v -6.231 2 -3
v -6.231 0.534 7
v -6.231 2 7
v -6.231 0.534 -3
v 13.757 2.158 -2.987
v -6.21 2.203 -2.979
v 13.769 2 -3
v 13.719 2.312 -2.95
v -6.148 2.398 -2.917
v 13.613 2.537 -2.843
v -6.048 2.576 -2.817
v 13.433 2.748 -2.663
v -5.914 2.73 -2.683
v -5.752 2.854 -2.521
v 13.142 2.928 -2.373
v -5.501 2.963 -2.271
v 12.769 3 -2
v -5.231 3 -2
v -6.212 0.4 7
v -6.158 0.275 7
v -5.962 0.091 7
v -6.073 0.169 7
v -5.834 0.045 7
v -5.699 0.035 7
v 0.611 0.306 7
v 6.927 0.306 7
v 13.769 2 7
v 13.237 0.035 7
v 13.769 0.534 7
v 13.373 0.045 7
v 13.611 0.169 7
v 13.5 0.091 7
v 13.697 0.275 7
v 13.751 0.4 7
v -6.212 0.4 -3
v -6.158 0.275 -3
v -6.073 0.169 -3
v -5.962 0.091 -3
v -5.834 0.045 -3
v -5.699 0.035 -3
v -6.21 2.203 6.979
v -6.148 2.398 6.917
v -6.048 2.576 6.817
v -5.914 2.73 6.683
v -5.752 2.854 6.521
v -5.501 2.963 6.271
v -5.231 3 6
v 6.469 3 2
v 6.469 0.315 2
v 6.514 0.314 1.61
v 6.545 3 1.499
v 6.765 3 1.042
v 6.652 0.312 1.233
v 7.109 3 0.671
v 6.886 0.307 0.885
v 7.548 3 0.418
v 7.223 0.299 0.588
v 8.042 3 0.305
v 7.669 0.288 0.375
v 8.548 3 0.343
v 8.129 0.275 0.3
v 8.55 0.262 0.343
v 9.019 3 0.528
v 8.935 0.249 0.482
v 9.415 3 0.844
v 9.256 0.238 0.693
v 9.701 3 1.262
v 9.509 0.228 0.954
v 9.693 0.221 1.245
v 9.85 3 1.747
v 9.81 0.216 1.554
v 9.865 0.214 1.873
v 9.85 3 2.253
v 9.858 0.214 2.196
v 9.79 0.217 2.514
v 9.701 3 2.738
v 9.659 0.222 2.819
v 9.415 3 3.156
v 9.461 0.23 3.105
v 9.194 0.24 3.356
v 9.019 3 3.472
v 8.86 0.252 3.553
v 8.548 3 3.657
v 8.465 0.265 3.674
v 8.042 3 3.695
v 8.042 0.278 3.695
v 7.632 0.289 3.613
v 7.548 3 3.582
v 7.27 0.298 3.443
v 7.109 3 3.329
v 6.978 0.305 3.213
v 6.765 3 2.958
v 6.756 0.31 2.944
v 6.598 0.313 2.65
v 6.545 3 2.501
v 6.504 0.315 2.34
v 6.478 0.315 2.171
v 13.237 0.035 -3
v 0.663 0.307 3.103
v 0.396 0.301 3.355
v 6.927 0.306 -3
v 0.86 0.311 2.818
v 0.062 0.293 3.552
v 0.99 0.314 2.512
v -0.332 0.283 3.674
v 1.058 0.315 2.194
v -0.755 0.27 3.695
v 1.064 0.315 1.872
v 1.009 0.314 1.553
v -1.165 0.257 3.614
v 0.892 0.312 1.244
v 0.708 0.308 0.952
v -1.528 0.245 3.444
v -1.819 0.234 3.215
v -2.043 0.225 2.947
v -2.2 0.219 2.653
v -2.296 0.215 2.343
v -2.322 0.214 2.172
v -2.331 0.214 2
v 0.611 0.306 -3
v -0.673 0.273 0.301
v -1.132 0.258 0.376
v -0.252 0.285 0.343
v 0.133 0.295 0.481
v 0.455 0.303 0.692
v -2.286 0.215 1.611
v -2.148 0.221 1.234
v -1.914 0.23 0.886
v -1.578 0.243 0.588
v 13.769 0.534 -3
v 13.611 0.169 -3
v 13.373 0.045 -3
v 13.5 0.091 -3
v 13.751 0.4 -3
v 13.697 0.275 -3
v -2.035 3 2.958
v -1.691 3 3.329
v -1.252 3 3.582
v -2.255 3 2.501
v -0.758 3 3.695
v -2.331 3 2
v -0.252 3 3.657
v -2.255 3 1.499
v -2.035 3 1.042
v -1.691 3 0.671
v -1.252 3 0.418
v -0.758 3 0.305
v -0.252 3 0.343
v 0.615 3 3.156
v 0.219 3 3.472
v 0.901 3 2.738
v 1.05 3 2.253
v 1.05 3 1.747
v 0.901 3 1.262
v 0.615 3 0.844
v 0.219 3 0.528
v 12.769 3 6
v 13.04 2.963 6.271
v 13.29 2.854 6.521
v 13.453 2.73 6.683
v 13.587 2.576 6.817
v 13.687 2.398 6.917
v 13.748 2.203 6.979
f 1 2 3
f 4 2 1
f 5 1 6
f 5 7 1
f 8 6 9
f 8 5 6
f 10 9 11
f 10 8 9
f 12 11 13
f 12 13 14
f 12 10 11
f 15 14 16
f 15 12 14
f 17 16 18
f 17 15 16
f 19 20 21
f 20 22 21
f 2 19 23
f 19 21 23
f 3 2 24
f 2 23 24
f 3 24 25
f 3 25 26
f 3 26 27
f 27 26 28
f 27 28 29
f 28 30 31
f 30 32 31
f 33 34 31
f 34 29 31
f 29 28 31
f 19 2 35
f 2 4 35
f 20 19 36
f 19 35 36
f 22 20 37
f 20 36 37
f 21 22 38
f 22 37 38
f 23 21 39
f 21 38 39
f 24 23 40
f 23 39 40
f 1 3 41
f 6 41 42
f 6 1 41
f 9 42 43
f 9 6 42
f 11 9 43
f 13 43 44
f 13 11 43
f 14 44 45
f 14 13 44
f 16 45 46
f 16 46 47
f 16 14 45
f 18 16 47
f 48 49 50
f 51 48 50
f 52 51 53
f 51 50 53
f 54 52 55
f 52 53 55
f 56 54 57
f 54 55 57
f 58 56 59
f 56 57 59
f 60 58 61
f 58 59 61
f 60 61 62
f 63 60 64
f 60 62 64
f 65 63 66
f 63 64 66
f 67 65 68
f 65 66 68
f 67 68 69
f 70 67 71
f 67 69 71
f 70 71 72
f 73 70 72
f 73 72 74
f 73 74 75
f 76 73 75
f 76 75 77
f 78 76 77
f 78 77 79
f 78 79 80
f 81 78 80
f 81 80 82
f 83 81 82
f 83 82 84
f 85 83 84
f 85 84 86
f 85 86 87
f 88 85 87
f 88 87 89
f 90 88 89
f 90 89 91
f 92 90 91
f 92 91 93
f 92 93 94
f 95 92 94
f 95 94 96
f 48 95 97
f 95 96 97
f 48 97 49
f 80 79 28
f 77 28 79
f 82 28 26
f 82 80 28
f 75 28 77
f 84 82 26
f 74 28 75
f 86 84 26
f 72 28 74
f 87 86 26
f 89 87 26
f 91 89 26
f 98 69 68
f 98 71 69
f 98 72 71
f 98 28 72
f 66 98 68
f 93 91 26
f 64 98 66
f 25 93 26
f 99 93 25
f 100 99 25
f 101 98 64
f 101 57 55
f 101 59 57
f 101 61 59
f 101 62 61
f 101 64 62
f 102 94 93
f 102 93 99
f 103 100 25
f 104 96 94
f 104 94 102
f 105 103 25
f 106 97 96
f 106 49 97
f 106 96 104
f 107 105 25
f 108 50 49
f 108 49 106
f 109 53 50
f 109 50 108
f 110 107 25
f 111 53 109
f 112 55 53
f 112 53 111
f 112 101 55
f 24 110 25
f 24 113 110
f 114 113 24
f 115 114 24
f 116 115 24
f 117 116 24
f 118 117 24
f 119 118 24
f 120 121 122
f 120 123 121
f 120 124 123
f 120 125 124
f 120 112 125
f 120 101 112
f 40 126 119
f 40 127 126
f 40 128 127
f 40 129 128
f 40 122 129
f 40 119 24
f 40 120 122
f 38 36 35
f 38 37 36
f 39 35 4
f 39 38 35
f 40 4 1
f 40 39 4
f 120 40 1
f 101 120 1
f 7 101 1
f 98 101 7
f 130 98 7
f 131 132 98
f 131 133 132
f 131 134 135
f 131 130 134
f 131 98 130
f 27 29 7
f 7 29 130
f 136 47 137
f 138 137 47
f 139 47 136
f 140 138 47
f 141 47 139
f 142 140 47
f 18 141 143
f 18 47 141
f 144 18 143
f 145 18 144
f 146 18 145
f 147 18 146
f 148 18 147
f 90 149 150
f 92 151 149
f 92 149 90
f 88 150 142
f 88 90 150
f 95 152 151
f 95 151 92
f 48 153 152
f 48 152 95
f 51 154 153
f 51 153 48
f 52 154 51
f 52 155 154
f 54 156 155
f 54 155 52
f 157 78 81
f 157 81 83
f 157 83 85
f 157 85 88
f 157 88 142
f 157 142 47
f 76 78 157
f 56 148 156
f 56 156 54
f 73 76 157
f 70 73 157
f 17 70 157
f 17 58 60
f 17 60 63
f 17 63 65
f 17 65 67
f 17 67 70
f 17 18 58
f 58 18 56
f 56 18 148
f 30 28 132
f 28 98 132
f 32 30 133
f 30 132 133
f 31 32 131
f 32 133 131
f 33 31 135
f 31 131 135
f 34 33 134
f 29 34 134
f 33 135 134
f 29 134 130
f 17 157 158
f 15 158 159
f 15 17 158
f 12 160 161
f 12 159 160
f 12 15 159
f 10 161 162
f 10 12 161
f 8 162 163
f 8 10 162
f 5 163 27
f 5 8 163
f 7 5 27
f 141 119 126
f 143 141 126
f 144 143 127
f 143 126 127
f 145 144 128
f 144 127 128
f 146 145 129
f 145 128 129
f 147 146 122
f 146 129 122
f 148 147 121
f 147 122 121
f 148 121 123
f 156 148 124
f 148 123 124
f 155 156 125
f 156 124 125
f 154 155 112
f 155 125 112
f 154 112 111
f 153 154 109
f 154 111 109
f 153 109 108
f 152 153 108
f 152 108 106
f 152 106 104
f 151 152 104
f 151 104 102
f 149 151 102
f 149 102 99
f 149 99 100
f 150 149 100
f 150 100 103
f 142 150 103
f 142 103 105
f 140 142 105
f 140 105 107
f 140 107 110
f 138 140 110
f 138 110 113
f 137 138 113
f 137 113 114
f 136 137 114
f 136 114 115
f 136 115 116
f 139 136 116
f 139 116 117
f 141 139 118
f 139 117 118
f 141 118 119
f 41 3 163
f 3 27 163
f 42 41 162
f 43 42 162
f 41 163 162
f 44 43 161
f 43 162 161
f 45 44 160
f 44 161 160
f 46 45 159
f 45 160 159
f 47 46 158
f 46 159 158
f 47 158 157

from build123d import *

# Parameters (mm, degrees)
SKETCH1_W            = 20
SKETCH1_H            = 10
BOSS_EXTRUDE1_DEPTH  = 3
M3_CLEARANCE_HOLE1_D = 3.4
FILLET3_R            = 1
CUT_EXTRUDE4_START   = -10
CUT_EXTRUDE4_DEPTH   = 10
FILLET4_R            = 0.5


# Read off the part's stored shape, not the designer's step: Cut-Extrude4
with BuildPart() as part:
    # Sketch1 → Boss-Extrude1 (new body)
    with BuildSketch(Plane(origin=(0, 0, 0), x_dir=(1, 0, 0), z_dir=(0, 1, 0))):
        with Locations((3.769230769, -2)):
            Rectangle(SKETCH1_W, SKETCH1_H)
    extrude(amount=BOSS_EXTRUDE1_DEPTH)

    # M3 Clearance Hole1 (through all)
    with Locations(Plane(origin=(0, 3, 0), x_dir=(1, 0, 0), z_dir=(0, 1, 0))):
        with Locations((-0.630769231, -2), (8.169230769, -2)):
            Hole(M3_CLEARANCE_HOLE1_D / 2)

    # Fillet3
    fillet3_edges = [part.edges().sort_by_distance(p)[0] for p in [
        (3.769230769, 3, 7),
        (13.769230769, 3, 2),
        (3.769230769, 3, -3),
        (-6.230769231, 3, 2),
    ]]
    fillet(fillet3_edges, radius=FILLET3_R)

    # Cut-Extrude4 outline → Cut-Extrude4 (cut)
    with BuildSketch(Plane.XY.offset(7).offset(CUT_EXTRUDE4_START)):
        with BuildLine():
            ThreePointArc((13.769230769, 0), (3.769230769, 0.339931125), (-6.230769231, 0))
            Line((-6.230769231, 0), (13.769230769, 0))
        make_face()
    extrude(amount=CUT_EXTRUDE4_DEPTH, mode=Mode.SUBTRACT)

    # Fillet4
    fillet4_edges = [part.edges().sort_by_distance(p)[0] for p in [
        (13.769230769, 0, 2),
        (-6.230769231, 0, 2),
    ]]
    fillet(fillet4_edges, radius=FILLET4_R)


solid = part.part
